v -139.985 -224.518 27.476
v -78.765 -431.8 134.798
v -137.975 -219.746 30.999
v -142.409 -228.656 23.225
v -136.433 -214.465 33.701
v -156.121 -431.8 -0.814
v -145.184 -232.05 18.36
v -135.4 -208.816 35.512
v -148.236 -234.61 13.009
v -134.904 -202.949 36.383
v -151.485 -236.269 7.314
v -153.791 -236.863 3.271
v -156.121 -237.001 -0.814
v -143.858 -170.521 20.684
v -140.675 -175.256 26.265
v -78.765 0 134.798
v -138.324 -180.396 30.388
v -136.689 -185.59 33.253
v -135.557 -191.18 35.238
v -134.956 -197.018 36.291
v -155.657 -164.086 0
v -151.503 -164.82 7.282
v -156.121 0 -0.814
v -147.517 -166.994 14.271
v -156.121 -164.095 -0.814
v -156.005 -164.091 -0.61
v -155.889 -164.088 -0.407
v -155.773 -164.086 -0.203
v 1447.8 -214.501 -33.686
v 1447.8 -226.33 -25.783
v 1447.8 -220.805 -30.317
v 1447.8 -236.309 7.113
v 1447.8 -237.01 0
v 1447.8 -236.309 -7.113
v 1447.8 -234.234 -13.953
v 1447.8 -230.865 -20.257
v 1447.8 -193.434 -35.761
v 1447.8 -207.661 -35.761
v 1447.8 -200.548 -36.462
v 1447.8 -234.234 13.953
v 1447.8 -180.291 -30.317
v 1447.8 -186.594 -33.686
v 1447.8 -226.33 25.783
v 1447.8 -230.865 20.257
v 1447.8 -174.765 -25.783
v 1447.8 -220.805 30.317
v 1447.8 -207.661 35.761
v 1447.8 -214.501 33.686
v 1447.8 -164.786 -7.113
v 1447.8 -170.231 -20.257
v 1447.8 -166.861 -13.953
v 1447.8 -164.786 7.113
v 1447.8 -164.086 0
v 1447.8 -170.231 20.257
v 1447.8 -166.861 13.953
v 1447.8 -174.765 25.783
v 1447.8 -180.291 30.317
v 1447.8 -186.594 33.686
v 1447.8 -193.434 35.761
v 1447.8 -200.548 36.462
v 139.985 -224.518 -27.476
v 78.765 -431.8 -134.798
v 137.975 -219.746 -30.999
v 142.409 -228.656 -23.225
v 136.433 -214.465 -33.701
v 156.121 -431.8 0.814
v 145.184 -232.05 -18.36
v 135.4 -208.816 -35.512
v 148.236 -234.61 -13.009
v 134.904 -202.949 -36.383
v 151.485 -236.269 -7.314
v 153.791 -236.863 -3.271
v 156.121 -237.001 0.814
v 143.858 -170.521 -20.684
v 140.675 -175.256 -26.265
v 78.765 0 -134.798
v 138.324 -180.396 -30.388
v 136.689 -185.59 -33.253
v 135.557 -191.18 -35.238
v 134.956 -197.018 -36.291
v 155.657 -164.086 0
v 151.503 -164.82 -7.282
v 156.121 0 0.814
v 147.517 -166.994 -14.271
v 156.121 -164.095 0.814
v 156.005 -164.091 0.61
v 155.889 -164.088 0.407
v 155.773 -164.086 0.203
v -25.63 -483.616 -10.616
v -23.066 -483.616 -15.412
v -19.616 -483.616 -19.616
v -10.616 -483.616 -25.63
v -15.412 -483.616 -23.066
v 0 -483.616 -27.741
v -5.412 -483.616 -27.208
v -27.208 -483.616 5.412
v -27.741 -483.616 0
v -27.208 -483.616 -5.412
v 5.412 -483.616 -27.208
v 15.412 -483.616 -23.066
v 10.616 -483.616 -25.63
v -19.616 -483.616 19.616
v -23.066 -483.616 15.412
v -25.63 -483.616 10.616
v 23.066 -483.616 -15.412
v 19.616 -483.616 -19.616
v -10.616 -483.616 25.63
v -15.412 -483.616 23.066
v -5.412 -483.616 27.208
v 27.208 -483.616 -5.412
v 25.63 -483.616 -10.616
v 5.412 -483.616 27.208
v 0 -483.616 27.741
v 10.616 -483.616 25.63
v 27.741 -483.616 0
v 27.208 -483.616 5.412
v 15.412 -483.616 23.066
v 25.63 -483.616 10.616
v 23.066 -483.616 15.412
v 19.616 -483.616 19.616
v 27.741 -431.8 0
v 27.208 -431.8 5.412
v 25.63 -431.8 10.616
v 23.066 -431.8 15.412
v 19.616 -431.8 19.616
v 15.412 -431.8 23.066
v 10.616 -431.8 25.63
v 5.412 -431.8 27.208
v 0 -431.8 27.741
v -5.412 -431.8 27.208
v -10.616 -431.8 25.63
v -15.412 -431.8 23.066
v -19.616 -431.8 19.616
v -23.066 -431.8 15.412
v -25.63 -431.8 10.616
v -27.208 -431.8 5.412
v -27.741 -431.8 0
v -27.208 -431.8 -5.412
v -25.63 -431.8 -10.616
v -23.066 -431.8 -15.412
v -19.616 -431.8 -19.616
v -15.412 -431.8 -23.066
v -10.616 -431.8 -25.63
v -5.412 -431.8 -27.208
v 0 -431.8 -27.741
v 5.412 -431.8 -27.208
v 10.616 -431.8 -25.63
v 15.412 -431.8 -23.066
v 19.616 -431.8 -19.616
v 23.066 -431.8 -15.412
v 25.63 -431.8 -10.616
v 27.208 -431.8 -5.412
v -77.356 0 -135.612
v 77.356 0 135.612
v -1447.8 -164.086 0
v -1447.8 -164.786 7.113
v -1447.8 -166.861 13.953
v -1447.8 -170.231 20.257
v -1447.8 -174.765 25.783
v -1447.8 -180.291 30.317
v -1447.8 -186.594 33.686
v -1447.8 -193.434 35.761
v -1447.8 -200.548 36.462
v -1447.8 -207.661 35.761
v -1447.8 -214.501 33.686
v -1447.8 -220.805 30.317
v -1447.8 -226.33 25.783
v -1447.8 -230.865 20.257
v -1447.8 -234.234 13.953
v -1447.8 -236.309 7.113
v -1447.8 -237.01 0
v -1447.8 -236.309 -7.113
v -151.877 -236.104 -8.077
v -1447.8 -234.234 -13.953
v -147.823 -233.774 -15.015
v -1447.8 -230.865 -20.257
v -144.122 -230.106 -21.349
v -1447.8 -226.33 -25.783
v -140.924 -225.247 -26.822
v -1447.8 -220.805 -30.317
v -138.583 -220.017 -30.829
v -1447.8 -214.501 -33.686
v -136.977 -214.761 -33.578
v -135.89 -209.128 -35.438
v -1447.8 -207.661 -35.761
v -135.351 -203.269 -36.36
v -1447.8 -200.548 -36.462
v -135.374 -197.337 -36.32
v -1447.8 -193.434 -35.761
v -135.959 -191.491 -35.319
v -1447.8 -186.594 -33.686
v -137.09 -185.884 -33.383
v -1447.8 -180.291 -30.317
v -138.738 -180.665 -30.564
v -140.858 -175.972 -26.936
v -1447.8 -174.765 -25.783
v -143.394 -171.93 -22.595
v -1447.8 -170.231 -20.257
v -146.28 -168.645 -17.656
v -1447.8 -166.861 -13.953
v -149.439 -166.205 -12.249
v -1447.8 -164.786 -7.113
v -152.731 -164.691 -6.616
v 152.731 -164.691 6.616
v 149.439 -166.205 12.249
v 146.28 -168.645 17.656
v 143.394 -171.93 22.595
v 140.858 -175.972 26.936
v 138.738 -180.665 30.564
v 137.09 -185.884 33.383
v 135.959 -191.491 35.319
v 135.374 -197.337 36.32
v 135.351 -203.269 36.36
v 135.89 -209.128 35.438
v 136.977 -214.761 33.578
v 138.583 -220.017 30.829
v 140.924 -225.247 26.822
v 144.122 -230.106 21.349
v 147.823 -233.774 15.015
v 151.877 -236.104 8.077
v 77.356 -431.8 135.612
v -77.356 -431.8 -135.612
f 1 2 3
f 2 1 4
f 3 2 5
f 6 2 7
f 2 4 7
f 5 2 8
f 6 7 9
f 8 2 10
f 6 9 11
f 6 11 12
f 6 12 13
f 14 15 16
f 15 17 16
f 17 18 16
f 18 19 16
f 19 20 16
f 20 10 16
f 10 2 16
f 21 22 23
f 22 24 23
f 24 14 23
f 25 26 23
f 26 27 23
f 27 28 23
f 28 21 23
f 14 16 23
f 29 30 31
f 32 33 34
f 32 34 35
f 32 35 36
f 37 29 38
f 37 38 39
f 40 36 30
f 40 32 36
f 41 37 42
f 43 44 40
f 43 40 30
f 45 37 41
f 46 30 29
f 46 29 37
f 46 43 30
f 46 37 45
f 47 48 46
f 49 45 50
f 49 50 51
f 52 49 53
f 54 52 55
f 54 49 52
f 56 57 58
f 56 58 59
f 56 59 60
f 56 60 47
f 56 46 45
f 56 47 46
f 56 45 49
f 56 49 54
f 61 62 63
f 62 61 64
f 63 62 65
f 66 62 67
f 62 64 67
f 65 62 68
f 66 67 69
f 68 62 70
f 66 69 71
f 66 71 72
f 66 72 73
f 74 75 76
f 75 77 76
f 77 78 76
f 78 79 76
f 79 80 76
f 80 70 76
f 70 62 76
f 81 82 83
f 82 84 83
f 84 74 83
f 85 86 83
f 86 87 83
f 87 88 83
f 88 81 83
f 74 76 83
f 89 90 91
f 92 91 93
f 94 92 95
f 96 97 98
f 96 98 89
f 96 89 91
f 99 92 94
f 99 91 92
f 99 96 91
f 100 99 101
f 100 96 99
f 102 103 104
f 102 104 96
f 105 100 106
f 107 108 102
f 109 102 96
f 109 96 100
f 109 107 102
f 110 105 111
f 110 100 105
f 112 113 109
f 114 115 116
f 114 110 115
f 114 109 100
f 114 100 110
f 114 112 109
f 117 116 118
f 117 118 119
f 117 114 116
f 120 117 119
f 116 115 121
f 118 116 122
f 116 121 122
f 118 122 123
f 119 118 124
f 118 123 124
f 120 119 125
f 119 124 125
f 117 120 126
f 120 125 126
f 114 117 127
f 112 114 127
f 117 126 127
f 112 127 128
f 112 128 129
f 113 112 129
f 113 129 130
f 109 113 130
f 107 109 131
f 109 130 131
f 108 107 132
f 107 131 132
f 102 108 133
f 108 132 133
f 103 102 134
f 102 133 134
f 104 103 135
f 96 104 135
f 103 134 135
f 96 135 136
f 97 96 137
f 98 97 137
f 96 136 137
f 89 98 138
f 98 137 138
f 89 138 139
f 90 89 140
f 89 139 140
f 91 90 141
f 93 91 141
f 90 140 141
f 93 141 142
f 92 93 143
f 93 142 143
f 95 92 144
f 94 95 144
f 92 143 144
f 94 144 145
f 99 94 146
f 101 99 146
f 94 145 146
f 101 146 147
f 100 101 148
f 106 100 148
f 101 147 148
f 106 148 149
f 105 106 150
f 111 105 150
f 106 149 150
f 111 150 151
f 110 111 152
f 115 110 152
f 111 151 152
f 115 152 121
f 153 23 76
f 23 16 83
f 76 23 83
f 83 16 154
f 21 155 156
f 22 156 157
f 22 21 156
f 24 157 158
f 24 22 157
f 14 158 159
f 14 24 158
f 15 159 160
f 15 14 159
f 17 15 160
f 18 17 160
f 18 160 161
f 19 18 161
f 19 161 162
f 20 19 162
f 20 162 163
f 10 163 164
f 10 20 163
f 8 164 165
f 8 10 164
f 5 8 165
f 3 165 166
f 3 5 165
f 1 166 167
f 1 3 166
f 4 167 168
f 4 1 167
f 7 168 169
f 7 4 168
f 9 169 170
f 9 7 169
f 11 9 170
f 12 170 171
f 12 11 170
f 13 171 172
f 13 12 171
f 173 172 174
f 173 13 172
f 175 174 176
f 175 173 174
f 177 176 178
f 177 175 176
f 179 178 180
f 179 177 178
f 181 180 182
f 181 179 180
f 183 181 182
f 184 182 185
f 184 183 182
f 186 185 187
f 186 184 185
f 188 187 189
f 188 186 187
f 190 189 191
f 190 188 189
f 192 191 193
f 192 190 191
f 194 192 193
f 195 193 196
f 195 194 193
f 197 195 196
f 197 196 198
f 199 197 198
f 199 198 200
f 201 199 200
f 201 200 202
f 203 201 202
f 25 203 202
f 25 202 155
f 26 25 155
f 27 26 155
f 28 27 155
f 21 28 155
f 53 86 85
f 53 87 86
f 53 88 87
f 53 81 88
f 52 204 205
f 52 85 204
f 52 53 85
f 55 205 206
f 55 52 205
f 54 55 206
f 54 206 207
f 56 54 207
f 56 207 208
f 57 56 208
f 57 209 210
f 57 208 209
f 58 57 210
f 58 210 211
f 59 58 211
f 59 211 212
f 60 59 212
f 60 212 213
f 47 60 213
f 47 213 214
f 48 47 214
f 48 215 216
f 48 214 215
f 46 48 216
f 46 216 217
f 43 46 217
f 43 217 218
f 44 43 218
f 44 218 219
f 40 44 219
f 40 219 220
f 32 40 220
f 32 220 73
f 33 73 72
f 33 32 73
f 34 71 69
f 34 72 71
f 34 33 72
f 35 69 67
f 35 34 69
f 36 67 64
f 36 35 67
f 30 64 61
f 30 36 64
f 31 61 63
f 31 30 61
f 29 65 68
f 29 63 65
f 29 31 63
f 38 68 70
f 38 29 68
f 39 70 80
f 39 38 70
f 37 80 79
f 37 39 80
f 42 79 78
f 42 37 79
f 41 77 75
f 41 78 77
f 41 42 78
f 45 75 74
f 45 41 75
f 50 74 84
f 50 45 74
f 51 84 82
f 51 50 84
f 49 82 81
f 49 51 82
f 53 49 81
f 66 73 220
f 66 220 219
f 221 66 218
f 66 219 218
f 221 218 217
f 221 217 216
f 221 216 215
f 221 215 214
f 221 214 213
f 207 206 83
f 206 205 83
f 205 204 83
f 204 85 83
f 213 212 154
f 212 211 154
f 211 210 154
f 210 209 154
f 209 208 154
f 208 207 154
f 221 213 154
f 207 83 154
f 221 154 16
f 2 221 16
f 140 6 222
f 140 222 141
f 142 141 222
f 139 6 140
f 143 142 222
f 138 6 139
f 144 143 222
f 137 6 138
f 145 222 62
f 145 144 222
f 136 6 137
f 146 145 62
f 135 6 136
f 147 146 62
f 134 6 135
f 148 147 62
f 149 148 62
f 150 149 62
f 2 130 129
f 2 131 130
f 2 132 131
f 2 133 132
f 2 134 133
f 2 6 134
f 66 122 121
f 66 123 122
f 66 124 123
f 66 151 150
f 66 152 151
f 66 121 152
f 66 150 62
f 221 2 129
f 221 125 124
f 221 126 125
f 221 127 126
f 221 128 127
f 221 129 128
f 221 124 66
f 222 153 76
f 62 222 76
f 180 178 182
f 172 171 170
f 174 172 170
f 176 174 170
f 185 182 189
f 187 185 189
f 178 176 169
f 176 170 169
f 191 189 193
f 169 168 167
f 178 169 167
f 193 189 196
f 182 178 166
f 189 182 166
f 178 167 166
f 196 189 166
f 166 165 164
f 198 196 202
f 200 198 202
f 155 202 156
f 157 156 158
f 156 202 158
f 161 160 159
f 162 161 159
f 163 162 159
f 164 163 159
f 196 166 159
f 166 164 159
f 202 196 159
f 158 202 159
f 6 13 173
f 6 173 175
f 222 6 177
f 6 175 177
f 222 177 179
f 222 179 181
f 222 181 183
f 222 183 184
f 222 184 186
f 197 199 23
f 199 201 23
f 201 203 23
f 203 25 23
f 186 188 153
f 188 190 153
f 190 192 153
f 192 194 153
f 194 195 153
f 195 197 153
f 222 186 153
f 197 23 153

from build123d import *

# Parameters (mm, degrees)
F1_DEPTH = 431.8
F2_R     = 27.741248
F3_DEPTH = 51.816
F4_R     = 36.461975
F5_DEPTH = 1447.8


with BuildPart() as f1:
    # F0 (on Front) → F1 (new body)
    with BuildSketch(Plane.XZ):
        Polygon((78.76529, -134.798247), (156.121351, 0.813618), (77.356061, 135.611866), (-78.76529, 134.798247), (-156.121351, -0.813618), (-77.356061, -135.611866), align=None)
    extrude(amount=F1_DEPTH)

    # F2 (on face) → F3 (join)
    with BuildSketch(Plane.XZ.offset(431.8)):
        Circle(F2_R)
    extrude(amount=F3_DEPTH)

    # F4 (on Right) → F5 (join, symmetric)
    with BuildSketch(Plane.YZ):
        with Locations((-200.54774, 0)):
            Circle(F4_R)
    extrude(amount=F5_DEPTH, both=True)


solid = f1.part
